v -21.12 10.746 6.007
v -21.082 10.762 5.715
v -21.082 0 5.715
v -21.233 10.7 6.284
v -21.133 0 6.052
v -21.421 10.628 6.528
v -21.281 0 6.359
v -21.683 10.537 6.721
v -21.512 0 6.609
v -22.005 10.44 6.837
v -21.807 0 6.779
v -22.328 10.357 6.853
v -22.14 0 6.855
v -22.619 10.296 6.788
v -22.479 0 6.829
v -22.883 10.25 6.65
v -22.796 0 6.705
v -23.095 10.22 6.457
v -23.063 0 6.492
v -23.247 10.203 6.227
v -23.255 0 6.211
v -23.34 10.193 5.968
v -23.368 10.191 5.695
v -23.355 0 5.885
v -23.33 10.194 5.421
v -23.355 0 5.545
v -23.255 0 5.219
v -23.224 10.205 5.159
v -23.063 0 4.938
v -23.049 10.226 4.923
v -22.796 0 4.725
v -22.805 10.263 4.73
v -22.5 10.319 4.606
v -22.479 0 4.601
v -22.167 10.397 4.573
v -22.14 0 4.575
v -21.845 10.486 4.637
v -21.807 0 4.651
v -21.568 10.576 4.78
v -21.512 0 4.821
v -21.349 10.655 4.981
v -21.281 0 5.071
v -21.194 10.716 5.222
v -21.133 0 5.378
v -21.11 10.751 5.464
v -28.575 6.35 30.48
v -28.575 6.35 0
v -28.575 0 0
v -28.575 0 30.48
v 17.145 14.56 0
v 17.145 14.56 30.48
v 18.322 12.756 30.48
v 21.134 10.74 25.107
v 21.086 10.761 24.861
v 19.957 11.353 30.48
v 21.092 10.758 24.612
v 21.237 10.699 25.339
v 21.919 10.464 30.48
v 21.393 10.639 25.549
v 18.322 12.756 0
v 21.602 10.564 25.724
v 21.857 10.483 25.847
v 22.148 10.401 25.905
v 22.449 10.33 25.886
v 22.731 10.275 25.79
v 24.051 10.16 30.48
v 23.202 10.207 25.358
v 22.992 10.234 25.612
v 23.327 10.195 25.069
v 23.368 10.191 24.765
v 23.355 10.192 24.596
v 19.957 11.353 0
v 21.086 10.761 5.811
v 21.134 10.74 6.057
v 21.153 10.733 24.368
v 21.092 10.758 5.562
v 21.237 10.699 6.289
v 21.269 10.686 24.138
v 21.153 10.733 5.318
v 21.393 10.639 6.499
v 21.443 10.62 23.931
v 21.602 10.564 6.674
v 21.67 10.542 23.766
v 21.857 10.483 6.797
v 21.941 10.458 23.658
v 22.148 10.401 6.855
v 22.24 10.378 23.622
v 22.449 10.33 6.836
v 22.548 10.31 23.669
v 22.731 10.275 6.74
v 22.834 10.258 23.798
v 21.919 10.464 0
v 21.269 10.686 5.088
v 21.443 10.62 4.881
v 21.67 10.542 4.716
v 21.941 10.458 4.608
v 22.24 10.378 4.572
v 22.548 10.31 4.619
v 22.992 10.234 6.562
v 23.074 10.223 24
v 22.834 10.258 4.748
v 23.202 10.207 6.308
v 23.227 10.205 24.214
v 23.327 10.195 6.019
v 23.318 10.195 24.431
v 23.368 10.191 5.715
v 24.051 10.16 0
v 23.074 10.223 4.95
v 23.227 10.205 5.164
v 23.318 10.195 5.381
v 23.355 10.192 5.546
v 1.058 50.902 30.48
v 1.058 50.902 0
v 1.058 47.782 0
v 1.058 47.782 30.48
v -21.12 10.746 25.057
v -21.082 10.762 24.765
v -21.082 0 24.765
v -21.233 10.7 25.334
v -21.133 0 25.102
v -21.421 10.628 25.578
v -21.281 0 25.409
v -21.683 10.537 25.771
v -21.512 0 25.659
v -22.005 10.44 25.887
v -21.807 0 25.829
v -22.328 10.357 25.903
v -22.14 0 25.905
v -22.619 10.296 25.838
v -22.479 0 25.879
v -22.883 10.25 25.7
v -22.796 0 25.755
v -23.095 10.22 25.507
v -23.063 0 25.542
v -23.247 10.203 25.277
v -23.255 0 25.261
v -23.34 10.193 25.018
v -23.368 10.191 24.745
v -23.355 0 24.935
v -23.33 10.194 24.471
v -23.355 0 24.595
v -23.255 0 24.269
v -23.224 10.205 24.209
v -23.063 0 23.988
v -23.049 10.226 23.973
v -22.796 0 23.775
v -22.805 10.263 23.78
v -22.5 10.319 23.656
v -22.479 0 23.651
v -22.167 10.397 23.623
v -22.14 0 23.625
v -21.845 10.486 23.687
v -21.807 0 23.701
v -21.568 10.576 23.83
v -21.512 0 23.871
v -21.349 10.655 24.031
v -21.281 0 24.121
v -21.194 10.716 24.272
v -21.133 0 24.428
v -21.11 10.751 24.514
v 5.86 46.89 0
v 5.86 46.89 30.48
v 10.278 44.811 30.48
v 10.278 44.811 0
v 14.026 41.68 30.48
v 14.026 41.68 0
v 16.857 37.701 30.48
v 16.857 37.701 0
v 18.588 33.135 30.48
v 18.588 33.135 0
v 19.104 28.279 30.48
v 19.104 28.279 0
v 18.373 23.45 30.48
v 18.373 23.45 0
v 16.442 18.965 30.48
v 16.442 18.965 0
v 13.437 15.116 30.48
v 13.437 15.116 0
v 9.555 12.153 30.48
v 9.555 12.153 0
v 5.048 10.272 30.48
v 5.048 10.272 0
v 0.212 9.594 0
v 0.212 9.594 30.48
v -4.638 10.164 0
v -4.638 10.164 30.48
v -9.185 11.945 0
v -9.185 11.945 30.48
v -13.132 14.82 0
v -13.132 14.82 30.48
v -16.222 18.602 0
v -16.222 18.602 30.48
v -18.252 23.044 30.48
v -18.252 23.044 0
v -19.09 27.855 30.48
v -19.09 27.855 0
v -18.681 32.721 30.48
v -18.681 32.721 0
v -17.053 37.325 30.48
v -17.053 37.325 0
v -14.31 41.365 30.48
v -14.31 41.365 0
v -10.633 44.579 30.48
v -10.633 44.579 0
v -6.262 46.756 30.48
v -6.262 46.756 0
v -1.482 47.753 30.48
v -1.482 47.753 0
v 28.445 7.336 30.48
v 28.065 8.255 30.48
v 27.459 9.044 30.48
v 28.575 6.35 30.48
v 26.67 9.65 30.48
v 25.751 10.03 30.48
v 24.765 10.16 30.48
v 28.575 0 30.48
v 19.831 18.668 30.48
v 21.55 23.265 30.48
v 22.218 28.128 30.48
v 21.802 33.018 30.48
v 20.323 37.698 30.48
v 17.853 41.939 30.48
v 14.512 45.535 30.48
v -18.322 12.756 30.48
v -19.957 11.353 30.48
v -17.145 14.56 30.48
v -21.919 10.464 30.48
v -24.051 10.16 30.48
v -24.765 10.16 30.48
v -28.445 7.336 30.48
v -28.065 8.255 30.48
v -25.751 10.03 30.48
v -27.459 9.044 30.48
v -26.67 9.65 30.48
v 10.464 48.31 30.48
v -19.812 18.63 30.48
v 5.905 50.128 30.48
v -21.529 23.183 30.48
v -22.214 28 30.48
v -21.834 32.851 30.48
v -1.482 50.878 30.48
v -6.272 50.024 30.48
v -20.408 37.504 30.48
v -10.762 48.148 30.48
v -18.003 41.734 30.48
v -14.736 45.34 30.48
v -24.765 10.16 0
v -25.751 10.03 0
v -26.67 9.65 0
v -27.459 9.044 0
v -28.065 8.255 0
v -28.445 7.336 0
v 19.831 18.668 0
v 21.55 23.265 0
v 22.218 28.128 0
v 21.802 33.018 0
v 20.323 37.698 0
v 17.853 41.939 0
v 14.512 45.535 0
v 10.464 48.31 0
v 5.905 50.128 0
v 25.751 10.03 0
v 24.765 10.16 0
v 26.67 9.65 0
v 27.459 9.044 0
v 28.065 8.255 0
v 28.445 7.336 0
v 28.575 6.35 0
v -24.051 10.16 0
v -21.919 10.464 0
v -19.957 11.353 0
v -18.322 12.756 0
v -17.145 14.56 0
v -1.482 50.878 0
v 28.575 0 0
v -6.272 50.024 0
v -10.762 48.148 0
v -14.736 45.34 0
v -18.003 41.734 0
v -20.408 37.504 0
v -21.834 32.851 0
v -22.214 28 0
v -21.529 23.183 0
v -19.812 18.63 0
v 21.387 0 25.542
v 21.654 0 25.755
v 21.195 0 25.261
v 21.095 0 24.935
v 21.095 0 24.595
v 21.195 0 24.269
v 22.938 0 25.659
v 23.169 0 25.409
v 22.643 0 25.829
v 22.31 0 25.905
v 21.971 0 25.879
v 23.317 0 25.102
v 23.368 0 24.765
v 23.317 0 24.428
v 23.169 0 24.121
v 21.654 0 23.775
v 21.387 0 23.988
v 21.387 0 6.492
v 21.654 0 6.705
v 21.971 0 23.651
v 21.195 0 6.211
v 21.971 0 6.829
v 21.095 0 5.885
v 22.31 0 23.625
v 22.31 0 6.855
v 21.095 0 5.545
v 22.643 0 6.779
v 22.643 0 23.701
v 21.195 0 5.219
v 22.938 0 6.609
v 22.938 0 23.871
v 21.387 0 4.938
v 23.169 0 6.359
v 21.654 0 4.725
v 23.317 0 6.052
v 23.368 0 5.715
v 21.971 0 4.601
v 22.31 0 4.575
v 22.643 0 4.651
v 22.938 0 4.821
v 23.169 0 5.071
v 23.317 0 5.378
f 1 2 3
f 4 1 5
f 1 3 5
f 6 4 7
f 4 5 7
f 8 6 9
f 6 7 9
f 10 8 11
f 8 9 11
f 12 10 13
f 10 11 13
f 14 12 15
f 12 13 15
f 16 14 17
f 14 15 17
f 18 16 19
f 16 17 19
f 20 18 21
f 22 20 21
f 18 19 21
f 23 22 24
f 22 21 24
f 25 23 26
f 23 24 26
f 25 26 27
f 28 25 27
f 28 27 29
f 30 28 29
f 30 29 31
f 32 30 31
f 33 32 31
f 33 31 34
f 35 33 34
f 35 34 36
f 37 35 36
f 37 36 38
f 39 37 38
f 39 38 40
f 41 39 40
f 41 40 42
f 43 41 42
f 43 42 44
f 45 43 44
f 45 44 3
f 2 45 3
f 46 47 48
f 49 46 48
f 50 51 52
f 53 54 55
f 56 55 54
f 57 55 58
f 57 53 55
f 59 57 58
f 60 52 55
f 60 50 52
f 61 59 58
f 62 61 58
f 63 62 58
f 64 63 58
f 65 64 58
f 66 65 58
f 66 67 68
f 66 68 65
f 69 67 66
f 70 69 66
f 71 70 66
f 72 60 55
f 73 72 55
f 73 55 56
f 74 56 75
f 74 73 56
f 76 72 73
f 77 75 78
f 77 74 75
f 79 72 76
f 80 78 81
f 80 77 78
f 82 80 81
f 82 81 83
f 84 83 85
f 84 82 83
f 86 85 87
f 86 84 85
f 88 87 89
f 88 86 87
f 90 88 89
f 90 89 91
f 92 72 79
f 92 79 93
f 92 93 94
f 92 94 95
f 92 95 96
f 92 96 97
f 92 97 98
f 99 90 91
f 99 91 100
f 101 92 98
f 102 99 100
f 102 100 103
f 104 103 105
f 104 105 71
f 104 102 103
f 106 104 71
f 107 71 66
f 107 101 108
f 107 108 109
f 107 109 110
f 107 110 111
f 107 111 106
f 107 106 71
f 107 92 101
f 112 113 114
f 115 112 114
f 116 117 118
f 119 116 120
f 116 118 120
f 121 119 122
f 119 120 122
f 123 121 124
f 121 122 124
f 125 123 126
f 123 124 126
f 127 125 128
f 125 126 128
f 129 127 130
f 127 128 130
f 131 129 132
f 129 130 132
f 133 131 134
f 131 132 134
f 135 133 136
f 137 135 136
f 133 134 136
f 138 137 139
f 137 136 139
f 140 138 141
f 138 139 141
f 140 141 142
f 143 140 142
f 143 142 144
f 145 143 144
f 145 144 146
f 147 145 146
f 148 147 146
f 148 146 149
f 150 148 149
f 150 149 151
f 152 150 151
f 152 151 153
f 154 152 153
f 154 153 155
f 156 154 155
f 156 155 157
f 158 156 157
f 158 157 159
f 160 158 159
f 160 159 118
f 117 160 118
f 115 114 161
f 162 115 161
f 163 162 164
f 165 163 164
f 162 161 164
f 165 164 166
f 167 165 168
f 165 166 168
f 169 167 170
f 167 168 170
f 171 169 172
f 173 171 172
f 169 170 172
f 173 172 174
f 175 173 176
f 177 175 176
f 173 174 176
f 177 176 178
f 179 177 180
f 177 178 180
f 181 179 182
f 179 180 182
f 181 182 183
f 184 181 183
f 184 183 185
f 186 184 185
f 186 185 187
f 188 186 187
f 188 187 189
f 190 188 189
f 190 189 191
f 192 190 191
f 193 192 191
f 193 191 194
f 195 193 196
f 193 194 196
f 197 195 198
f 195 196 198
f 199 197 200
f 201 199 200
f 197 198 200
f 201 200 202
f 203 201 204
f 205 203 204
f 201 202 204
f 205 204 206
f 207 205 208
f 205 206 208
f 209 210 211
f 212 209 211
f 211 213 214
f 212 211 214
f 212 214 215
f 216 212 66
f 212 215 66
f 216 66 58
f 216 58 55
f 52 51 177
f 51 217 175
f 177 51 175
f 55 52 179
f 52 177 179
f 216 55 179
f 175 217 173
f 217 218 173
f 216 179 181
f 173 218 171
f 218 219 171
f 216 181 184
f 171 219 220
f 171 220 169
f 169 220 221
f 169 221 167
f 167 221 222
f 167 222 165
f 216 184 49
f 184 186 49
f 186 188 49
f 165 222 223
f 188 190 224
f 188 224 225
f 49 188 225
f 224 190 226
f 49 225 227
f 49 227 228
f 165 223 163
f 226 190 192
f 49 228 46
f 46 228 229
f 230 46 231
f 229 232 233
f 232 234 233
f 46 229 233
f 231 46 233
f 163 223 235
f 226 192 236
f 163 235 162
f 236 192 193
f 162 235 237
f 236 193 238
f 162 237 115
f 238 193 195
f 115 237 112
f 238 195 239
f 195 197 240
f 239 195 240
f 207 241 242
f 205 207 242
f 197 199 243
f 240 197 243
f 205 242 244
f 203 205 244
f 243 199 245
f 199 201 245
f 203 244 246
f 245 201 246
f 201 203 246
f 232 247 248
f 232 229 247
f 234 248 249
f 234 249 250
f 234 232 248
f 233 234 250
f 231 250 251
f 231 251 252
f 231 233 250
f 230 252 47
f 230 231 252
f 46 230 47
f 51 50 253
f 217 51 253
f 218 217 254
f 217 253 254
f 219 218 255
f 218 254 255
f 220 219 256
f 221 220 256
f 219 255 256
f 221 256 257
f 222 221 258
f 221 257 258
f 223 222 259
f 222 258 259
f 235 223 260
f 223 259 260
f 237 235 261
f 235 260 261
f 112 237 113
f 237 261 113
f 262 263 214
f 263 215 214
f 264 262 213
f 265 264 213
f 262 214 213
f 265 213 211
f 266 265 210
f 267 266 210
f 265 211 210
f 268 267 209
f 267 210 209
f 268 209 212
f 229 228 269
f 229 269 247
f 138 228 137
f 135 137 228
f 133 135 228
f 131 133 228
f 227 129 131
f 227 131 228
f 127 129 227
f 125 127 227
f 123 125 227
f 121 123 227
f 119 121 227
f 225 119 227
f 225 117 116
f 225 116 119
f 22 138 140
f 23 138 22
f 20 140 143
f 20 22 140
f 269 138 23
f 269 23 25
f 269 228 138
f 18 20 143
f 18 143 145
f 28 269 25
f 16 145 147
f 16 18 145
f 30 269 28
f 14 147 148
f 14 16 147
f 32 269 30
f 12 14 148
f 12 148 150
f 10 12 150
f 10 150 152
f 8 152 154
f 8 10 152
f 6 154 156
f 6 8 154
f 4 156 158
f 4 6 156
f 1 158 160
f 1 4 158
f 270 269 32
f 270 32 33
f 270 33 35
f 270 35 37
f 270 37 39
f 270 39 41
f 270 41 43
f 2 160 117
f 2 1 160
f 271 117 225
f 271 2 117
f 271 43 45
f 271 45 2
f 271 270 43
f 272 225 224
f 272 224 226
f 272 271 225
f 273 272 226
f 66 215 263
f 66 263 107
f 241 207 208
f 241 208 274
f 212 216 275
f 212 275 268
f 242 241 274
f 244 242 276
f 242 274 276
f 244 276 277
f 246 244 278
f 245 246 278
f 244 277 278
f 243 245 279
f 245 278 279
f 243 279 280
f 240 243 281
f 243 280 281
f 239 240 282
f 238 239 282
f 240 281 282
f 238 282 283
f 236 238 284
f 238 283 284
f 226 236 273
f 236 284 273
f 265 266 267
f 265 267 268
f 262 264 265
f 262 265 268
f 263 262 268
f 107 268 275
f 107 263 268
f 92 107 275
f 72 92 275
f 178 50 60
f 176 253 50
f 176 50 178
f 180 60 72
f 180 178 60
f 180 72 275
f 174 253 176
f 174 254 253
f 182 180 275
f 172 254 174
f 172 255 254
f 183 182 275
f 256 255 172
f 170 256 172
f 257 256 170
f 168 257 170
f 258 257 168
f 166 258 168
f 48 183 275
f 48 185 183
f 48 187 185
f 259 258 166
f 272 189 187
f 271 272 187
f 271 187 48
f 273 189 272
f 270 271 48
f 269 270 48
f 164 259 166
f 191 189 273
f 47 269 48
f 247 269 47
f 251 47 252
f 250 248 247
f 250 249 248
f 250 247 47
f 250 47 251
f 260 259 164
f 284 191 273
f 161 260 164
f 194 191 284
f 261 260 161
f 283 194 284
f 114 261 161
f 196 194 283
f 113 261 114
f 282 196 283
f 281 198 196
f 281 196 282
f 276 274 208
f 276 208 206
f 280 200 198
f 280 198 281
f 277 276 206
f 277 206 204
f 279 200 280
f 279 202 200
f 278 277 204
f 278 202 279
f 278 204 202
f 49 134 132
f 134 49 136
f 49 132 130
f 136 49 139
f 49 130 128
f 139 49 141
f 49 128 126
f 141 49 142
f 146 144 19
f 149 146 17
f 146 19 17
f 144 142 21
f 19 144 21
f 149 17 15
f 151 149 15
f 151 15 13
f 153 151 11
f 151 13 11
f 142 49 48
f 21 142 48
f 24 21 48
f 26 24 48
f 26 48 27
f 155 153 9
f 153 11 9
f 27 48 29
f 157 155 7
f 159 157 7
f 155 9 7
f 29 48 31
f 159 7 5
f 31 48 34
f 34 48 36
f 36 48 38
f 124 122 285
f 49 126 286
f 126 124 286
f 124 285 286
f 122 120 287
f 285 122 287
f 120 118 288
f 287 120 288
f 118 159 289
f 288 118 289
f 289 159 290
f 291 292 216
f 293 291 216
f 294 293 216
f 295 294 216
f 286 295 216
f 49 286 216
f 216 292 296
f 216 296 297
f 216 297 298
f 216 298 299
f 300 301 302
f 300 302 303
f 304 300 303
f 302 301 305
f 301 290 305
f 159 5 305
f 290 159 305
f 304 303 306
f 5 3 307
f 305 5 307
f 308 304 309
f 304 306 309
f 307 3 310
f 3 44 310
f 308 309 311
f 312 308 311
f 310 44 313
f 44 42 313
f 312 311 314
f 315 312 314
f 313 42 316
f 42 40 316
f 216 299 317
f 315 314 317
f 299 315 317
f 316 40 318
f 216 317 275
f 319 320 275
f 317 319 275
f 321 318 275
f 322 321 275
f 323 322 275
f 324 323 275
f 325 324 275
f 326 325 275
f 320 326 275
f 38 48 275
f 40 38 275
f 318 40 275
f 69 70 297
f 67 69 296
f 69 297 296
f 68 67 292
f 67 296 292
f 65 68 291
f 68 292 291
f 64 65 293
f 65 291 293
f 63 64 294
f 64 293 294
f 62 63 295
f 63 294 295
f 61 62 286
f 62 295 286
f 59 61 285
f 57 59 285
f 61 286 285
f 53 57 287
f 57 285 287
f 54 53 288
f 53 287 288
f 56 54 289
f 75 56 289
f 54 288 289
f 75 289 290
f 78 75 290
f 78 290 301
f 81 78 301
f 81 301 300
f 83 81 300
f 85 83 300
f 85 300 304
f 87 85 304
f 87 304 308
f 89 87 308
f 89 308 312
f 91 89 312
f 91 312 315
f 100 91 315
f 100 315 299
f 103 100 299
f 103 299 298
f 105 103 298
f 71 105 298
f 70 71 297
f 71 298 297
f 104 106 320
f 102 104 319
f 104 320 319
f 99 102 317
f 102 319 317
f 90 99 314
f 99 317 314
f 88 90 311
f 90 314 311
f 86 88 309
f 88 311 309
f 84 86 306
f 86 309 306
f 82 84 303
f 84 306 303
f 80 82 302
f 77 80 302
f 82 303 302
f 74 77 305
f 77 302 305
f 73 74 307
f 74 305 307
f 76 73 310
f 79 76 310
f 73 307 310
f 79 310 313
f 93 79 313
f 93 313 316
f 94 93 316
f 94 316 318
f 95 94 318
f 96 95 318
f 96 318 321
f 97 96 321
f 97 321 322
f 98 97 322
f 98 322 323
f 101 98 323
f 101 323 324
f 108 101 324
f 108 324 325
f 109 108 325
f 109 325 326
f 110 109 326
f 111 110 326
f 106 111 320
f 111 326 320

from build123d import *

# Parameters (mm, degrees)
BOSS_EXTRUDE1_DEPTH = 30.48
FILLET1_R           = 7.62
FILLET2_R           = 3.81
CUT_EXTRUDE1_REACH  = 67.853
SKETCH2_R           = 1.143


with BuildPart() as part:
    # Sketch1 → Boss-Extrude1 (new body)
    with BuildSketch(Plane.XY):
        with BuildLine():
            Line((-28.575, 0), (28.575, 0))
            Line((28.575, 0), (28.575, 10.16))
            Line((28.575, 10.16), (17.145, 10.16))
            Line((17.145, 10.16), (17.145, 14.559878518))
            ThreePointArc((17.145, 14.559878518), (20.322966492, 37.697980101), (1.058217697, 50.901792799))
            Line((1.058217697, 50.901792799), (1.058217697, 47.78156187))
            ThreePointArc((1.058217697, 47.78156187), (0.212193658, 9.594292663), (-1.481666667, 47.753356112))
            Line((-1.481666667, 47.753356112), (-1.481666667, 50.877556112))
            ThreePointArc((-1.481666667, 50.877556112), (-20.407880934, 37.503648753), (-17.145, 14.559878518))
            Line((-17.145, 14.559878518), (-17.145, 10.16))
            Line((-17.145, 10.16), (-28.575, 10.16))
            Line((-28.575, 10.16), (-28.575, 0))
        make_face()
    extrude(amount=BOSS_EXTRUDE1_DEPTH)

    # Fillet1
    # the kernel refuses this fillet: 7.62 mm, written as the material it adds along each edge
    with BuildSketch(Plane(origin=(-17.145, 10.16, 0), x_dir=(0, 1, 0), z_dir=(0, 0, 1))) as fillet1_piece_1:
        with BuildLine():
            CenterArc((7.62, 6.906172431), FILLET1_R, 180, 65.001905453)
            Line((0, 6.906172431), (-0.1524, 6.906172431))
            Line((-0.1524, 6.906172431), (-0.1524, 0))
            Line((-0.1524, 0), (0, -0.1524))
            ThreePointArc((0, -0.1524), (2.199939259, -0.1524), (4.335476089, -0.138123449))
            Line((4.335476089, -0.138123449), (4.399878518, 0))
        make_face()
    extrude(amount=30.48)
    with BuildSketch(Plane(origin=(17.145, 10.16, 0), x_dir=(1, 0, 0), z_dir=(0, 0, 1))) as fillet1_piece_2:
        with BuildLine():
            CenterArc((6.906172431, 7.62), FILLET1_R, 204.998094547, 65.001905453)
            Line((0, 4.399878518), (-0.138123449, 4.335476089))
            ThreePointArc((-0.138123449, 4.335476089), (-0.1524, 2.199939259), (-0.1524, 0))
            Line((-0.1524, 0), (0, -0.1524))
            Line((0, -0.1524), (6.906172431, -0.1524))
            Line((6.906172431, -0.1524), (6.906172431, 0))
        make_face()
    extrude(amount=30.48)

    # Fillet2
    fillet2_edges = [part.edges().sort_by_distance(p)[0] for p in [
        (-28.575, 10.16, 15.24),
        (28.575, 10.16, 15.24),
    ]]
    fillet(fillet2_edges, radius=FILLET2_R)

    # Sketch2 → Cut-Extrude1 (cut, up to next)
    with BuildSketch(Plane.XZ, mode=Mode.PRIVATE) as cut_extrude1_sk1:
        with Locations((-22.225, 5.715)):
            Circle(SKETCH2_R)
    cut_extrude1_tool1 = extrude(cut_extrude1_sk1.sketch, amount=-CUT_EXTRUDE1_REACH, mode=Mode.PRIVATE) & part.part
    # Sketch2 → Cut-Extrude1 (cut, up to next)
    with BuildSketch(Plane.XZ, mode=Mode.PRIVATE) as cut_extrude1_sk2:
        with Locations((-22.225, 24.765)):
            Circle(SKETCH2_R)
    cut_extrude1_tool2 = extrude(cut_extrude1_sk2.sketch, amount=-CUT_EXTRUDE1_REACH, mode=Mode.PRIVATE) & part.part
    # Sketch2 → Cut-Extrude1 (cut, up to next)
    with BuildSketch(Plane.XZ, mode=Mode.PRIVATE) as cut_extrude1_sk3:
        with Locations((22.225, 24.765)):
            Circle(SKETCH2_R)
    cut_extrude1_tool3 = extrude(cut_extrude1_sk3.sketch, amount=-CUT_EXTRUDE1_REACH, mode=Mode.PRIVATE) & part.part
    # Sketch2 → Cut-Extrude1 (cut, up to next)
    with BuildSketch(Plane.XZ, mode=Mode.PRIVATE) as cut_extrude1_sk4:
        with Locations((22.225, 5.715)):
            Circle(SKETCH2_R)
    cut_extrude1_tool4 = extrude(cut_extrude1_sk4.sketch, amount=-CUT_EXTRUDE1_REACH, mode=Mode.PRIVATE) & part.part
    add(cut_extrude1_tool1.solids().sort_by_distance((-22.225, 0, 5.715))[0], mode=Mode.SUBTRACT)
    add(cut_extrude1_tool2.solids().sort_by_distance((-22.225, 0, 24.765))[0], mode=Mode.SUBTRACT)
    add(cut_extrude1_tool3.solids().sort_by_distance((22.225, 0, 24.765))[0], mode=Mode.SUBTRACT)
    add(cut_extrude1_tool4.solids().sort_by_distance((22.225, 0, 5.715))[0], mode=Mode.SUBTRACT)


solid = part.part
